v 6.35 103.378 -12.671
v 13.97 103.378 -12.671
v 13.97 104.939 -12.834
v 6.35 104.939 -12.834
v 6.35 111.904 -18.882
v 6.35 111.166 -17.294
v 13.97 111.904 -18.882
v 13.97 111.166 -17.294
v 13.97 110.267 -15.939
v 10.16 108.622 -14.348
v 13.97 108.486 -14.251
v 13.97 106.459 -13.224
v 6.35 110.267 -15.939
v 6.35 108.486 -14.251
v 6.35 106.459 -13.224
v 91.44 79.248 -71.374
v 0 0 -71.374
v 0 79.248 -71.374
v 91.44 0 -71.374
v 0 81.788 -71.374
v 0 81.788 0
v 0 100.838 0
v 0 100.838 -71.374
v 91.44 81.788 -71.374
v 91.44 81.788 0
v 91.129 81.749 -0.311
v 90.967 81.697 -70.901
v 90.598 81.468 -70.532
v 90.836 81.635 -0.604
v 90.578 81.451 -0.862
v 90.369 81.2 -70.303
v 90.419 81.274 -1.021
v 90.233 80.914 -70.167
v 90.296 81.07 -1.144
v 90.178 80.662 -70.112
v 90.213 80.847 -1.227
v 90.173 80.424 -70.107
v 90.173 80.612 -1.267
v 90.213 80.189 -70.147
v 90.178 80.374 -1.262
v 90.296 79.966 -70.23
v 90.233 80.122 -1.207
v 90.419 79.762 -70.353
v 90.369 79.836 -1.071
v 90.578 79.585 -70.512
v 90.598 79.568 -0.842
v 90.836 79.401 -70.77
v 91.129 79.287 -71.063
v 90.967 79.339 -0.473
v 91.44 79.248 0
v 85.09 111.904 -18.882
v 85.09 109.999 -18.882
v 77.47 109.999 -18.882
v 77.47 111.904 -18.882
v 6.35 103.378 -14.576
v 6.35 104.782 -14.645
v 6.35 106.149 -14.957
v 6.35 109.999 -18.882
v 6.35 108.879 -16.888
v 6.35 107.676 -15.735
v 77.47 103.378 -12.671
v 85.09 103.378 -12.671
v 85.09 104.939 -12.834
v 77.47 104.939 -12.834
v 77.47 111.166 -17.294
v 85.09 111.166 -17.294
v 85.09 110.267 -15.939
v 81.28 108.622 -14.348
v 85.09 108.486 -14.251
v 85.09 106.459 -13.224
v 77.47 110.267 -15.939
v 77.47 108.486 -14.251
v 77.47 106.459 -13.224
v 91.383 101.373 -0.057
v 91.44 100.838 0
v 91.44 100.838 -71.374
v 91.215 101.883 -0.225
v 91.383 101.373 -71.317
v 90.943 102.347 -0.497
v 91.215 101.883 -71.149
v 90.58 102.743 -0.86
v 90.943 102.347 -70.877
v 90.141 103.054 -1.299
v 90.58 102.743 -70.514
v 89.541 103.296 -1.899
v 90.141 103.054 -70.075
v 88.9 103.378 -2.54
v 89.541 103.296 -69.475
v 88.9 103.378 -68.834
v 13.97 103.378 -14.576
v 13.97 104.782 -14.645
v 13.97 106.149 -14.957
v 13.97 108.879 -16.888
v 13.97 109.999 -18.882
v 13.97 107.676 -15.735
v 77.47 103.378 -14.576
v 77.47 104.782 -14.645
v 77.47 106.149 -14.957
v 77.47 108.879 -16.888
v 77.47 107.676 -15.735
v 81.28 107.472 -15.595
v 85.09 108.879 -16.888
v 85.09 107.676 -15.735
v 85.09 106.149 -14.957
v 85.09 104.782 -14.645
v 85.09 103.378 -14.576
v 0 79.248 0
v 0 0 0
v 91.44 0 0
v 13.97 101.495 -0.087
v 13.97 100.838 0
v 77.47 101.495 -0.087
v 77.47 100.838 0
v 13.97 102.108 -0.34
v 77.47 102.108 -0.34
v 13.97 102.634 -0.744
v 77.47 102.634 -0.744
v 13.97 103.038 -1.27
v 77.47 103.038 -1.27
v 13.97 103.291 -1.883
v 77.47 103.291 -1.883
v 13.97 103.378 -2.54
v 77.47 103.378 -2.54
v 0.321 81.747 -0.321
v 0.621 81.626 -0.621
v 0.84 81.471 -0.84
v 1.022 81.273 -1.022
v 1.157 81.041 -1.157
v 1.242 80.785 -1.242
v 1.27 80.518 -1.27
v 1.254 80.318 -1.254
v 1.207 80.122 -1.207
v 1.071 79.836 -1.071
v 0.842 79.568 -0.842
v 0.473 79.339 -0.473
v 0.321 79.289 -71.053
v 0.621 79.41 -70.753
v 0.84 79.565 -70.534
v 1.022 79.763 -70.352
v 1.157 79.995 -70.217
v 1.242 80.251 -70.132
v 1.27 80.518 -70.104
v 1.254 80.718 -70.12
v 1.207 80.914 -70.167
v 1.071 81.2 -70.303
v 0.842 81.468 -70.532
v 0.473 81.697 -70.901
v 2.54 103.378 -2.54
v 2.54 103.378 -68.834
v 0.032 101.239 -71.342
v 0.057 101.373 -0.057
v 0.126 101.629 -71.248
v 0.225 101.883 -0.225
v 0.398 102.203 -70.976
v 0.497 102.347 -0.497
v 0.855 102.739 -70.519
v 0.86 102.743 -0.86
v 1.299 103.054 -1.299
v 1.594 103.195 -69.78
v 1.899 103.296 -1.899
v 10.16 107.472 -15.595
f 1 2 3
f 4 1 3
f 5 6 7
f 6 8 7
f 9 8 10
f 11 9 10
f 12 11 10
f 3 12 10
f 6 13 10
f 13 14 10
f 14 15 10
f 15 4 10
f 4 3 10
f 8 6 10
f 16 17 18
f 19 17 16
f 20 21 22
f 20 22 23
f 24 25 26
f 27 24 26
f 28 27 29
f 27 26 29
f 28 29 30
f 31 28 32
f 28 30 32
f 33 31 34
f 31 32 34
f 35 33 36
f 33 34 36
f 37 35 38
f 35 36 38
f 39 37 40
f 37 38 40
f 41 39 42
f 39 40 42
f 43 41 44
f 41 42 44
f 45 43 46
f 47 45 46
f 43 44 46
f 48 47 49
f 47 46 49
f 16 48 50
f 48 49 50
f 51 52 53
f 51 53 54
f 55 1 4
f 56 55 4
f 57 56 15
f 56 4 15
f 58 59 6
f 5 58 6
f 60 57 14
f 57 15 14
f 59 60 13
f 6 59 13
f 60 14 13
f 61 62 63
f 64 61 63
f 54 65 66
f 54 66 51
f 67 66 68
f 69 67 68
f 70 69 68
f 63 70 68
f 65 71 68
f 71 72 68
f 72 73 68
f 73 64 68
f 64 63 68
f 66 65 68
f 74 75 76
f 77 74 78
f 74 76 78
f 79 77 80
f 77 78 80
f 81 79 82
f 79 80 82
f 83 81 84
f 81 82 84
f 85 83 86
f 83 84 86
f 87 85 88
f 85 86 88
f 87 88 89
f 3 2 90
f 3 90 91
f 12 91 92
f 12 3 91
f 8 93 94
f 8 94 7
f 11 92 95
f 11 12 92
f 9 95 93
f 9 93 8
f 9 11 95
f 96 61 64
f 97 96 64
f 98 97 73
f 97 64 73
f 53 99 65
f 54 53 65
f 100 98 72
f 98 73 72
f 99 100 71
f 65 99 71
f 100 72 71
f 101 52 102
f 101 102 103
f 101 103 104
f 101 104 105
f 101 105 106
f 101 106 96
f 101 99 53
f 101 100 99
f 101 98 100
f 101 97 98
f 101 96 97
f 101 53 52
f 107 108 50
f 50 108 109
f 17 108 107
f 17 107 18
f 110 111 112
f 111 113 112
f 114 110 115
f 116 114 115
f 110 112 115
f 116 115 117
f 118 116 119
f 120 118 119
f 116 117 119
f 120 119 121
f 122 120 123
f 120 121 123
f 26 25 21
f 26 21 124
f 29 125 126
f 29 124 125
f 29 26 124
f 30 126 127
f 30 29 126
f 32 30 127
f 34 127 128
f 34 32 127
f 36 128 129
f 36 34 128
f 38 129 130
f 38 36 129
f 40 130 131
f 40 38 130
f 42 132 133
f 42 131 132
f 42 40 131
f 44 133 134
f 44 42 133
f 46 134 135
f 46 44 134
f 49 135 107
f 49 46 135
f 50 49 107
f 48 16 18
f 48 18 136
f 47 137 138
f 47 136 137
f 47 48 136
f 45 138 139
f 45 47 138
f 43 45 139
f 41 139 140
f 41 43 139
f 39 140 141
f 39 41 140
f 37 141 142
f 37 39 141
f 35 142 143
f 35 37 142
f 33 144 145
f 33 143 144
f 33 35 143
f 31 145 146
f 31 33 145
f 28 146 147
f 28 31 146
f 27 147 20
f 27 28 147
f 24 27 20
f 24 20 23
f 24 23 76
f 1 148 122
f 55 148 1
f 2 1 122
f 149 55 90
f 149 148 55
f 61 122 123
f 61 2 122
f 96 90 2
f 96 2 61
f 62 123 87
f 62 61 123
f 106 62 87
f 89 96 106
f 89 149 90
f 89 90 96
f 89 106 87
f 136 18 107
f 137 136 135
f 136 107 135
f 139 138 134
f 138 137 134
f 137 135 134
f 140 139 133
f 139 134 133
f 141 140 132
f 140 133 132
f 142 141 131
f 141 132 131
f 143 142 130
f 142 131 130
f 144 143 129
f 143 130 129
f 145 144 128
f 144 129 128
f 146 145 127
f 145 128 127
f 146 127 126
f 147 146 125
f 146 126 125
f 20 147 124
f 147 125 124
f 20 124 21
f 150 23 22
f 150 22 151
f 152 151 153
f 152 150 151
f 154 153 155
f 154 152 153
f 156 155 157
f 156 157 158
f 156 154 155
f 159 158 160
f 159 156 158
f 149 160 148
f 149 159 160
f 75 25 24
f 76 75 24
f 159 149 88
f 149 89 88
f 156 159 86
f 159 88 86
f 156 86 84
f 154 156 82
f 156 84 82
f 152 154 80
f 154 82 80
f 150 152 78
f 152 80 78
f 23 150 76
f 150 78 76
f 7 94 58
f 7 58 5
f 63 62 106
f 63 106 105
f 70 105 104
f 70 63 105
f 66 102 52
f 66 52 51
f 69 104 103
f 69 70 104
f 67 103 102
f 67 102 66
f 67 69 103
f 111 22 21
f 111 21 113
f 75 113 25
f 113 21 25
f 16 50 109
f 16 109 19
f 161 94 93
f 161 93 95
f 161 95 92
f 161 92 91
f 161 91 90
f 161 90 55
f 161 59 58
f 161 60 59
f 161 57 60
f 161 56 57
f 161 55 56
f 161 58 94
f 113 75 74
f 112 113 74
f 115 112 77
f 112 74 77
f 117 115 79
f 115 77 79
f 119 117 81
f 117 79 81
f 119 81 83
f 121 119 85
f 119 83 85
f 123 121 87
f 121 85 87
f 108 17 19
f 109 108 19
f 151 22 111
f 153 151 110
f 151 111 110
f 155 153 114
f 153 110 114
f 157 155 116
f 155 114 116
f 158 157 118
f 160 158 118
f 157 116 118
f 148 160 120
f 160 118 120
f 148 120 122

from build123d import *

# Parameters (mm, degrees)
SKETCH1_W               = 91.44
SKETCH1_H               = 71.374
BOSS_EXTRUDE1_DEPTH     = 103.378
BOSS_EXTRUDE2_DEPTH     = 91.44
SKETCH3_W               = 6.35
SKETCH3_H               = 8.525765965
SKETCH3_W_2             = 63.5
CUT_EXTRUDE1_DEPTH      = 162.17684191
FILLET1_R               = 2.54
CUT_EXTRUDE2_DEPTH      = 162.176841809
CUT_EXTRUDE2_DEPTH_BACK = 162.176841809
SKETCH4_R               = 1.27
SKETCH5_R               = 1.27
CUT_EXTRUDE3_DEPTH      = 162.176841809


with BuildPart() as part:
    # Sketch1 → Boss-Extrude1 (new body)
    with BuildSketch(Plane(origin=(0, 0, 0), x_dir=(1, 0, 0), z_dir=(0, 1, 0))):
        with Locations((45.72, 35.687)):
            Rectangle(SKETCH1_W, SKETCH1_H)
    extrude(amount=BOSS_EXTRUDE1_DEPTH)

    # Sketch2 → Boss-Extrude2 (add)
    with BuildSketch(Plane(origin=(91.44, 0, 0), x_dir=(0, 0, -1), z_dir=(1, 0, 0))):
        with BuildLine():
            Line((12.671032171, 103.378), (14.576032171, 103.378))
            add(Edge.make_bspline(
                [(14.576032171, 103.378), (14.461628567, 108.255817866), (18.882181929, 109.998765965)],
                knots=[0, 0, 0, 1, 1, 1], degree=2))
            Line((18.882181929, 109.998765965), (18.882181929, 111.903765965))
            add(Edge.make_bspline(
                [(12.671032171, 103.378), (12.919876826, 109.602255935), (18.882181929, 111.903765965)],
                knots=[0, 0, 0, 1, 1, 1], degree=2))
        make_face()
    extrude(amount=-BOSS_EXTRUDE2_DEPTH)

    # Sketch3 → Cut-Extrude1 (cut, through all)
    with BuildSketch(Plane.XY):
        with Locations((3.175, 107.640882983)):
            Rectangle(SKETCH3_W, SKETCH3_H)
        with Locations((45.72, 107.640882983)):
            Rectangle(SKETCH3_W_2, SKETCH3_H)
        with Locations((88.265, 107.640882983)):
            Rectangle(SKETCH3_W, SKETCH3_H)
    extrude(amount=-CUT_EXTRUDE1_DEPTH, mode=Mode.SUBTRACT)

    # Fillet1
    fillet1_edges = [part.edges().sort_by_distance(p)[0] for p in [
        (91.44, 103.378, -35.687),
        (45.72, 103.378, -71.374),
        (0, 103.378, -35.687),
        (45.72, 103.378, 0),
    ]]
    fillet(fillet1_edges, radius=FILLET1_R)

    # Sketch4 → Cut-Extrude2 (cut, two sides: drawn at the far end of the back side and taken through both)
    with BuildSketch(Plane.ZY.offset(-CUT_EXTRUDE2_DEPTH_BACK)):
        with Locations((-71.374, 80.518)):
            Circle(SKETCH4_R)
        with Locations((0, 80.518)):
            Circle(SKETCH4_R)
    extrude(amount=CUT_EXTRUDE2_DEPTH + CUT_EXTRUDE2_DEPTH_BACK, mode=Mode.SUBTRACT)

    # Sketch5 → Cut-Extrude3 (cut, through all)
    with BuildSketch(Plane.XY):
        with Locations((0, 80.518)):
            Circle(SKETCH5_R)
        with Locations((91.44, 80.518)):
            Circle(SKETCH5_R)
    extrude(amount=-CUT_EXTRUDE3_DEPTH, mode=Mode.SUBTRACT)


solid = part.part
